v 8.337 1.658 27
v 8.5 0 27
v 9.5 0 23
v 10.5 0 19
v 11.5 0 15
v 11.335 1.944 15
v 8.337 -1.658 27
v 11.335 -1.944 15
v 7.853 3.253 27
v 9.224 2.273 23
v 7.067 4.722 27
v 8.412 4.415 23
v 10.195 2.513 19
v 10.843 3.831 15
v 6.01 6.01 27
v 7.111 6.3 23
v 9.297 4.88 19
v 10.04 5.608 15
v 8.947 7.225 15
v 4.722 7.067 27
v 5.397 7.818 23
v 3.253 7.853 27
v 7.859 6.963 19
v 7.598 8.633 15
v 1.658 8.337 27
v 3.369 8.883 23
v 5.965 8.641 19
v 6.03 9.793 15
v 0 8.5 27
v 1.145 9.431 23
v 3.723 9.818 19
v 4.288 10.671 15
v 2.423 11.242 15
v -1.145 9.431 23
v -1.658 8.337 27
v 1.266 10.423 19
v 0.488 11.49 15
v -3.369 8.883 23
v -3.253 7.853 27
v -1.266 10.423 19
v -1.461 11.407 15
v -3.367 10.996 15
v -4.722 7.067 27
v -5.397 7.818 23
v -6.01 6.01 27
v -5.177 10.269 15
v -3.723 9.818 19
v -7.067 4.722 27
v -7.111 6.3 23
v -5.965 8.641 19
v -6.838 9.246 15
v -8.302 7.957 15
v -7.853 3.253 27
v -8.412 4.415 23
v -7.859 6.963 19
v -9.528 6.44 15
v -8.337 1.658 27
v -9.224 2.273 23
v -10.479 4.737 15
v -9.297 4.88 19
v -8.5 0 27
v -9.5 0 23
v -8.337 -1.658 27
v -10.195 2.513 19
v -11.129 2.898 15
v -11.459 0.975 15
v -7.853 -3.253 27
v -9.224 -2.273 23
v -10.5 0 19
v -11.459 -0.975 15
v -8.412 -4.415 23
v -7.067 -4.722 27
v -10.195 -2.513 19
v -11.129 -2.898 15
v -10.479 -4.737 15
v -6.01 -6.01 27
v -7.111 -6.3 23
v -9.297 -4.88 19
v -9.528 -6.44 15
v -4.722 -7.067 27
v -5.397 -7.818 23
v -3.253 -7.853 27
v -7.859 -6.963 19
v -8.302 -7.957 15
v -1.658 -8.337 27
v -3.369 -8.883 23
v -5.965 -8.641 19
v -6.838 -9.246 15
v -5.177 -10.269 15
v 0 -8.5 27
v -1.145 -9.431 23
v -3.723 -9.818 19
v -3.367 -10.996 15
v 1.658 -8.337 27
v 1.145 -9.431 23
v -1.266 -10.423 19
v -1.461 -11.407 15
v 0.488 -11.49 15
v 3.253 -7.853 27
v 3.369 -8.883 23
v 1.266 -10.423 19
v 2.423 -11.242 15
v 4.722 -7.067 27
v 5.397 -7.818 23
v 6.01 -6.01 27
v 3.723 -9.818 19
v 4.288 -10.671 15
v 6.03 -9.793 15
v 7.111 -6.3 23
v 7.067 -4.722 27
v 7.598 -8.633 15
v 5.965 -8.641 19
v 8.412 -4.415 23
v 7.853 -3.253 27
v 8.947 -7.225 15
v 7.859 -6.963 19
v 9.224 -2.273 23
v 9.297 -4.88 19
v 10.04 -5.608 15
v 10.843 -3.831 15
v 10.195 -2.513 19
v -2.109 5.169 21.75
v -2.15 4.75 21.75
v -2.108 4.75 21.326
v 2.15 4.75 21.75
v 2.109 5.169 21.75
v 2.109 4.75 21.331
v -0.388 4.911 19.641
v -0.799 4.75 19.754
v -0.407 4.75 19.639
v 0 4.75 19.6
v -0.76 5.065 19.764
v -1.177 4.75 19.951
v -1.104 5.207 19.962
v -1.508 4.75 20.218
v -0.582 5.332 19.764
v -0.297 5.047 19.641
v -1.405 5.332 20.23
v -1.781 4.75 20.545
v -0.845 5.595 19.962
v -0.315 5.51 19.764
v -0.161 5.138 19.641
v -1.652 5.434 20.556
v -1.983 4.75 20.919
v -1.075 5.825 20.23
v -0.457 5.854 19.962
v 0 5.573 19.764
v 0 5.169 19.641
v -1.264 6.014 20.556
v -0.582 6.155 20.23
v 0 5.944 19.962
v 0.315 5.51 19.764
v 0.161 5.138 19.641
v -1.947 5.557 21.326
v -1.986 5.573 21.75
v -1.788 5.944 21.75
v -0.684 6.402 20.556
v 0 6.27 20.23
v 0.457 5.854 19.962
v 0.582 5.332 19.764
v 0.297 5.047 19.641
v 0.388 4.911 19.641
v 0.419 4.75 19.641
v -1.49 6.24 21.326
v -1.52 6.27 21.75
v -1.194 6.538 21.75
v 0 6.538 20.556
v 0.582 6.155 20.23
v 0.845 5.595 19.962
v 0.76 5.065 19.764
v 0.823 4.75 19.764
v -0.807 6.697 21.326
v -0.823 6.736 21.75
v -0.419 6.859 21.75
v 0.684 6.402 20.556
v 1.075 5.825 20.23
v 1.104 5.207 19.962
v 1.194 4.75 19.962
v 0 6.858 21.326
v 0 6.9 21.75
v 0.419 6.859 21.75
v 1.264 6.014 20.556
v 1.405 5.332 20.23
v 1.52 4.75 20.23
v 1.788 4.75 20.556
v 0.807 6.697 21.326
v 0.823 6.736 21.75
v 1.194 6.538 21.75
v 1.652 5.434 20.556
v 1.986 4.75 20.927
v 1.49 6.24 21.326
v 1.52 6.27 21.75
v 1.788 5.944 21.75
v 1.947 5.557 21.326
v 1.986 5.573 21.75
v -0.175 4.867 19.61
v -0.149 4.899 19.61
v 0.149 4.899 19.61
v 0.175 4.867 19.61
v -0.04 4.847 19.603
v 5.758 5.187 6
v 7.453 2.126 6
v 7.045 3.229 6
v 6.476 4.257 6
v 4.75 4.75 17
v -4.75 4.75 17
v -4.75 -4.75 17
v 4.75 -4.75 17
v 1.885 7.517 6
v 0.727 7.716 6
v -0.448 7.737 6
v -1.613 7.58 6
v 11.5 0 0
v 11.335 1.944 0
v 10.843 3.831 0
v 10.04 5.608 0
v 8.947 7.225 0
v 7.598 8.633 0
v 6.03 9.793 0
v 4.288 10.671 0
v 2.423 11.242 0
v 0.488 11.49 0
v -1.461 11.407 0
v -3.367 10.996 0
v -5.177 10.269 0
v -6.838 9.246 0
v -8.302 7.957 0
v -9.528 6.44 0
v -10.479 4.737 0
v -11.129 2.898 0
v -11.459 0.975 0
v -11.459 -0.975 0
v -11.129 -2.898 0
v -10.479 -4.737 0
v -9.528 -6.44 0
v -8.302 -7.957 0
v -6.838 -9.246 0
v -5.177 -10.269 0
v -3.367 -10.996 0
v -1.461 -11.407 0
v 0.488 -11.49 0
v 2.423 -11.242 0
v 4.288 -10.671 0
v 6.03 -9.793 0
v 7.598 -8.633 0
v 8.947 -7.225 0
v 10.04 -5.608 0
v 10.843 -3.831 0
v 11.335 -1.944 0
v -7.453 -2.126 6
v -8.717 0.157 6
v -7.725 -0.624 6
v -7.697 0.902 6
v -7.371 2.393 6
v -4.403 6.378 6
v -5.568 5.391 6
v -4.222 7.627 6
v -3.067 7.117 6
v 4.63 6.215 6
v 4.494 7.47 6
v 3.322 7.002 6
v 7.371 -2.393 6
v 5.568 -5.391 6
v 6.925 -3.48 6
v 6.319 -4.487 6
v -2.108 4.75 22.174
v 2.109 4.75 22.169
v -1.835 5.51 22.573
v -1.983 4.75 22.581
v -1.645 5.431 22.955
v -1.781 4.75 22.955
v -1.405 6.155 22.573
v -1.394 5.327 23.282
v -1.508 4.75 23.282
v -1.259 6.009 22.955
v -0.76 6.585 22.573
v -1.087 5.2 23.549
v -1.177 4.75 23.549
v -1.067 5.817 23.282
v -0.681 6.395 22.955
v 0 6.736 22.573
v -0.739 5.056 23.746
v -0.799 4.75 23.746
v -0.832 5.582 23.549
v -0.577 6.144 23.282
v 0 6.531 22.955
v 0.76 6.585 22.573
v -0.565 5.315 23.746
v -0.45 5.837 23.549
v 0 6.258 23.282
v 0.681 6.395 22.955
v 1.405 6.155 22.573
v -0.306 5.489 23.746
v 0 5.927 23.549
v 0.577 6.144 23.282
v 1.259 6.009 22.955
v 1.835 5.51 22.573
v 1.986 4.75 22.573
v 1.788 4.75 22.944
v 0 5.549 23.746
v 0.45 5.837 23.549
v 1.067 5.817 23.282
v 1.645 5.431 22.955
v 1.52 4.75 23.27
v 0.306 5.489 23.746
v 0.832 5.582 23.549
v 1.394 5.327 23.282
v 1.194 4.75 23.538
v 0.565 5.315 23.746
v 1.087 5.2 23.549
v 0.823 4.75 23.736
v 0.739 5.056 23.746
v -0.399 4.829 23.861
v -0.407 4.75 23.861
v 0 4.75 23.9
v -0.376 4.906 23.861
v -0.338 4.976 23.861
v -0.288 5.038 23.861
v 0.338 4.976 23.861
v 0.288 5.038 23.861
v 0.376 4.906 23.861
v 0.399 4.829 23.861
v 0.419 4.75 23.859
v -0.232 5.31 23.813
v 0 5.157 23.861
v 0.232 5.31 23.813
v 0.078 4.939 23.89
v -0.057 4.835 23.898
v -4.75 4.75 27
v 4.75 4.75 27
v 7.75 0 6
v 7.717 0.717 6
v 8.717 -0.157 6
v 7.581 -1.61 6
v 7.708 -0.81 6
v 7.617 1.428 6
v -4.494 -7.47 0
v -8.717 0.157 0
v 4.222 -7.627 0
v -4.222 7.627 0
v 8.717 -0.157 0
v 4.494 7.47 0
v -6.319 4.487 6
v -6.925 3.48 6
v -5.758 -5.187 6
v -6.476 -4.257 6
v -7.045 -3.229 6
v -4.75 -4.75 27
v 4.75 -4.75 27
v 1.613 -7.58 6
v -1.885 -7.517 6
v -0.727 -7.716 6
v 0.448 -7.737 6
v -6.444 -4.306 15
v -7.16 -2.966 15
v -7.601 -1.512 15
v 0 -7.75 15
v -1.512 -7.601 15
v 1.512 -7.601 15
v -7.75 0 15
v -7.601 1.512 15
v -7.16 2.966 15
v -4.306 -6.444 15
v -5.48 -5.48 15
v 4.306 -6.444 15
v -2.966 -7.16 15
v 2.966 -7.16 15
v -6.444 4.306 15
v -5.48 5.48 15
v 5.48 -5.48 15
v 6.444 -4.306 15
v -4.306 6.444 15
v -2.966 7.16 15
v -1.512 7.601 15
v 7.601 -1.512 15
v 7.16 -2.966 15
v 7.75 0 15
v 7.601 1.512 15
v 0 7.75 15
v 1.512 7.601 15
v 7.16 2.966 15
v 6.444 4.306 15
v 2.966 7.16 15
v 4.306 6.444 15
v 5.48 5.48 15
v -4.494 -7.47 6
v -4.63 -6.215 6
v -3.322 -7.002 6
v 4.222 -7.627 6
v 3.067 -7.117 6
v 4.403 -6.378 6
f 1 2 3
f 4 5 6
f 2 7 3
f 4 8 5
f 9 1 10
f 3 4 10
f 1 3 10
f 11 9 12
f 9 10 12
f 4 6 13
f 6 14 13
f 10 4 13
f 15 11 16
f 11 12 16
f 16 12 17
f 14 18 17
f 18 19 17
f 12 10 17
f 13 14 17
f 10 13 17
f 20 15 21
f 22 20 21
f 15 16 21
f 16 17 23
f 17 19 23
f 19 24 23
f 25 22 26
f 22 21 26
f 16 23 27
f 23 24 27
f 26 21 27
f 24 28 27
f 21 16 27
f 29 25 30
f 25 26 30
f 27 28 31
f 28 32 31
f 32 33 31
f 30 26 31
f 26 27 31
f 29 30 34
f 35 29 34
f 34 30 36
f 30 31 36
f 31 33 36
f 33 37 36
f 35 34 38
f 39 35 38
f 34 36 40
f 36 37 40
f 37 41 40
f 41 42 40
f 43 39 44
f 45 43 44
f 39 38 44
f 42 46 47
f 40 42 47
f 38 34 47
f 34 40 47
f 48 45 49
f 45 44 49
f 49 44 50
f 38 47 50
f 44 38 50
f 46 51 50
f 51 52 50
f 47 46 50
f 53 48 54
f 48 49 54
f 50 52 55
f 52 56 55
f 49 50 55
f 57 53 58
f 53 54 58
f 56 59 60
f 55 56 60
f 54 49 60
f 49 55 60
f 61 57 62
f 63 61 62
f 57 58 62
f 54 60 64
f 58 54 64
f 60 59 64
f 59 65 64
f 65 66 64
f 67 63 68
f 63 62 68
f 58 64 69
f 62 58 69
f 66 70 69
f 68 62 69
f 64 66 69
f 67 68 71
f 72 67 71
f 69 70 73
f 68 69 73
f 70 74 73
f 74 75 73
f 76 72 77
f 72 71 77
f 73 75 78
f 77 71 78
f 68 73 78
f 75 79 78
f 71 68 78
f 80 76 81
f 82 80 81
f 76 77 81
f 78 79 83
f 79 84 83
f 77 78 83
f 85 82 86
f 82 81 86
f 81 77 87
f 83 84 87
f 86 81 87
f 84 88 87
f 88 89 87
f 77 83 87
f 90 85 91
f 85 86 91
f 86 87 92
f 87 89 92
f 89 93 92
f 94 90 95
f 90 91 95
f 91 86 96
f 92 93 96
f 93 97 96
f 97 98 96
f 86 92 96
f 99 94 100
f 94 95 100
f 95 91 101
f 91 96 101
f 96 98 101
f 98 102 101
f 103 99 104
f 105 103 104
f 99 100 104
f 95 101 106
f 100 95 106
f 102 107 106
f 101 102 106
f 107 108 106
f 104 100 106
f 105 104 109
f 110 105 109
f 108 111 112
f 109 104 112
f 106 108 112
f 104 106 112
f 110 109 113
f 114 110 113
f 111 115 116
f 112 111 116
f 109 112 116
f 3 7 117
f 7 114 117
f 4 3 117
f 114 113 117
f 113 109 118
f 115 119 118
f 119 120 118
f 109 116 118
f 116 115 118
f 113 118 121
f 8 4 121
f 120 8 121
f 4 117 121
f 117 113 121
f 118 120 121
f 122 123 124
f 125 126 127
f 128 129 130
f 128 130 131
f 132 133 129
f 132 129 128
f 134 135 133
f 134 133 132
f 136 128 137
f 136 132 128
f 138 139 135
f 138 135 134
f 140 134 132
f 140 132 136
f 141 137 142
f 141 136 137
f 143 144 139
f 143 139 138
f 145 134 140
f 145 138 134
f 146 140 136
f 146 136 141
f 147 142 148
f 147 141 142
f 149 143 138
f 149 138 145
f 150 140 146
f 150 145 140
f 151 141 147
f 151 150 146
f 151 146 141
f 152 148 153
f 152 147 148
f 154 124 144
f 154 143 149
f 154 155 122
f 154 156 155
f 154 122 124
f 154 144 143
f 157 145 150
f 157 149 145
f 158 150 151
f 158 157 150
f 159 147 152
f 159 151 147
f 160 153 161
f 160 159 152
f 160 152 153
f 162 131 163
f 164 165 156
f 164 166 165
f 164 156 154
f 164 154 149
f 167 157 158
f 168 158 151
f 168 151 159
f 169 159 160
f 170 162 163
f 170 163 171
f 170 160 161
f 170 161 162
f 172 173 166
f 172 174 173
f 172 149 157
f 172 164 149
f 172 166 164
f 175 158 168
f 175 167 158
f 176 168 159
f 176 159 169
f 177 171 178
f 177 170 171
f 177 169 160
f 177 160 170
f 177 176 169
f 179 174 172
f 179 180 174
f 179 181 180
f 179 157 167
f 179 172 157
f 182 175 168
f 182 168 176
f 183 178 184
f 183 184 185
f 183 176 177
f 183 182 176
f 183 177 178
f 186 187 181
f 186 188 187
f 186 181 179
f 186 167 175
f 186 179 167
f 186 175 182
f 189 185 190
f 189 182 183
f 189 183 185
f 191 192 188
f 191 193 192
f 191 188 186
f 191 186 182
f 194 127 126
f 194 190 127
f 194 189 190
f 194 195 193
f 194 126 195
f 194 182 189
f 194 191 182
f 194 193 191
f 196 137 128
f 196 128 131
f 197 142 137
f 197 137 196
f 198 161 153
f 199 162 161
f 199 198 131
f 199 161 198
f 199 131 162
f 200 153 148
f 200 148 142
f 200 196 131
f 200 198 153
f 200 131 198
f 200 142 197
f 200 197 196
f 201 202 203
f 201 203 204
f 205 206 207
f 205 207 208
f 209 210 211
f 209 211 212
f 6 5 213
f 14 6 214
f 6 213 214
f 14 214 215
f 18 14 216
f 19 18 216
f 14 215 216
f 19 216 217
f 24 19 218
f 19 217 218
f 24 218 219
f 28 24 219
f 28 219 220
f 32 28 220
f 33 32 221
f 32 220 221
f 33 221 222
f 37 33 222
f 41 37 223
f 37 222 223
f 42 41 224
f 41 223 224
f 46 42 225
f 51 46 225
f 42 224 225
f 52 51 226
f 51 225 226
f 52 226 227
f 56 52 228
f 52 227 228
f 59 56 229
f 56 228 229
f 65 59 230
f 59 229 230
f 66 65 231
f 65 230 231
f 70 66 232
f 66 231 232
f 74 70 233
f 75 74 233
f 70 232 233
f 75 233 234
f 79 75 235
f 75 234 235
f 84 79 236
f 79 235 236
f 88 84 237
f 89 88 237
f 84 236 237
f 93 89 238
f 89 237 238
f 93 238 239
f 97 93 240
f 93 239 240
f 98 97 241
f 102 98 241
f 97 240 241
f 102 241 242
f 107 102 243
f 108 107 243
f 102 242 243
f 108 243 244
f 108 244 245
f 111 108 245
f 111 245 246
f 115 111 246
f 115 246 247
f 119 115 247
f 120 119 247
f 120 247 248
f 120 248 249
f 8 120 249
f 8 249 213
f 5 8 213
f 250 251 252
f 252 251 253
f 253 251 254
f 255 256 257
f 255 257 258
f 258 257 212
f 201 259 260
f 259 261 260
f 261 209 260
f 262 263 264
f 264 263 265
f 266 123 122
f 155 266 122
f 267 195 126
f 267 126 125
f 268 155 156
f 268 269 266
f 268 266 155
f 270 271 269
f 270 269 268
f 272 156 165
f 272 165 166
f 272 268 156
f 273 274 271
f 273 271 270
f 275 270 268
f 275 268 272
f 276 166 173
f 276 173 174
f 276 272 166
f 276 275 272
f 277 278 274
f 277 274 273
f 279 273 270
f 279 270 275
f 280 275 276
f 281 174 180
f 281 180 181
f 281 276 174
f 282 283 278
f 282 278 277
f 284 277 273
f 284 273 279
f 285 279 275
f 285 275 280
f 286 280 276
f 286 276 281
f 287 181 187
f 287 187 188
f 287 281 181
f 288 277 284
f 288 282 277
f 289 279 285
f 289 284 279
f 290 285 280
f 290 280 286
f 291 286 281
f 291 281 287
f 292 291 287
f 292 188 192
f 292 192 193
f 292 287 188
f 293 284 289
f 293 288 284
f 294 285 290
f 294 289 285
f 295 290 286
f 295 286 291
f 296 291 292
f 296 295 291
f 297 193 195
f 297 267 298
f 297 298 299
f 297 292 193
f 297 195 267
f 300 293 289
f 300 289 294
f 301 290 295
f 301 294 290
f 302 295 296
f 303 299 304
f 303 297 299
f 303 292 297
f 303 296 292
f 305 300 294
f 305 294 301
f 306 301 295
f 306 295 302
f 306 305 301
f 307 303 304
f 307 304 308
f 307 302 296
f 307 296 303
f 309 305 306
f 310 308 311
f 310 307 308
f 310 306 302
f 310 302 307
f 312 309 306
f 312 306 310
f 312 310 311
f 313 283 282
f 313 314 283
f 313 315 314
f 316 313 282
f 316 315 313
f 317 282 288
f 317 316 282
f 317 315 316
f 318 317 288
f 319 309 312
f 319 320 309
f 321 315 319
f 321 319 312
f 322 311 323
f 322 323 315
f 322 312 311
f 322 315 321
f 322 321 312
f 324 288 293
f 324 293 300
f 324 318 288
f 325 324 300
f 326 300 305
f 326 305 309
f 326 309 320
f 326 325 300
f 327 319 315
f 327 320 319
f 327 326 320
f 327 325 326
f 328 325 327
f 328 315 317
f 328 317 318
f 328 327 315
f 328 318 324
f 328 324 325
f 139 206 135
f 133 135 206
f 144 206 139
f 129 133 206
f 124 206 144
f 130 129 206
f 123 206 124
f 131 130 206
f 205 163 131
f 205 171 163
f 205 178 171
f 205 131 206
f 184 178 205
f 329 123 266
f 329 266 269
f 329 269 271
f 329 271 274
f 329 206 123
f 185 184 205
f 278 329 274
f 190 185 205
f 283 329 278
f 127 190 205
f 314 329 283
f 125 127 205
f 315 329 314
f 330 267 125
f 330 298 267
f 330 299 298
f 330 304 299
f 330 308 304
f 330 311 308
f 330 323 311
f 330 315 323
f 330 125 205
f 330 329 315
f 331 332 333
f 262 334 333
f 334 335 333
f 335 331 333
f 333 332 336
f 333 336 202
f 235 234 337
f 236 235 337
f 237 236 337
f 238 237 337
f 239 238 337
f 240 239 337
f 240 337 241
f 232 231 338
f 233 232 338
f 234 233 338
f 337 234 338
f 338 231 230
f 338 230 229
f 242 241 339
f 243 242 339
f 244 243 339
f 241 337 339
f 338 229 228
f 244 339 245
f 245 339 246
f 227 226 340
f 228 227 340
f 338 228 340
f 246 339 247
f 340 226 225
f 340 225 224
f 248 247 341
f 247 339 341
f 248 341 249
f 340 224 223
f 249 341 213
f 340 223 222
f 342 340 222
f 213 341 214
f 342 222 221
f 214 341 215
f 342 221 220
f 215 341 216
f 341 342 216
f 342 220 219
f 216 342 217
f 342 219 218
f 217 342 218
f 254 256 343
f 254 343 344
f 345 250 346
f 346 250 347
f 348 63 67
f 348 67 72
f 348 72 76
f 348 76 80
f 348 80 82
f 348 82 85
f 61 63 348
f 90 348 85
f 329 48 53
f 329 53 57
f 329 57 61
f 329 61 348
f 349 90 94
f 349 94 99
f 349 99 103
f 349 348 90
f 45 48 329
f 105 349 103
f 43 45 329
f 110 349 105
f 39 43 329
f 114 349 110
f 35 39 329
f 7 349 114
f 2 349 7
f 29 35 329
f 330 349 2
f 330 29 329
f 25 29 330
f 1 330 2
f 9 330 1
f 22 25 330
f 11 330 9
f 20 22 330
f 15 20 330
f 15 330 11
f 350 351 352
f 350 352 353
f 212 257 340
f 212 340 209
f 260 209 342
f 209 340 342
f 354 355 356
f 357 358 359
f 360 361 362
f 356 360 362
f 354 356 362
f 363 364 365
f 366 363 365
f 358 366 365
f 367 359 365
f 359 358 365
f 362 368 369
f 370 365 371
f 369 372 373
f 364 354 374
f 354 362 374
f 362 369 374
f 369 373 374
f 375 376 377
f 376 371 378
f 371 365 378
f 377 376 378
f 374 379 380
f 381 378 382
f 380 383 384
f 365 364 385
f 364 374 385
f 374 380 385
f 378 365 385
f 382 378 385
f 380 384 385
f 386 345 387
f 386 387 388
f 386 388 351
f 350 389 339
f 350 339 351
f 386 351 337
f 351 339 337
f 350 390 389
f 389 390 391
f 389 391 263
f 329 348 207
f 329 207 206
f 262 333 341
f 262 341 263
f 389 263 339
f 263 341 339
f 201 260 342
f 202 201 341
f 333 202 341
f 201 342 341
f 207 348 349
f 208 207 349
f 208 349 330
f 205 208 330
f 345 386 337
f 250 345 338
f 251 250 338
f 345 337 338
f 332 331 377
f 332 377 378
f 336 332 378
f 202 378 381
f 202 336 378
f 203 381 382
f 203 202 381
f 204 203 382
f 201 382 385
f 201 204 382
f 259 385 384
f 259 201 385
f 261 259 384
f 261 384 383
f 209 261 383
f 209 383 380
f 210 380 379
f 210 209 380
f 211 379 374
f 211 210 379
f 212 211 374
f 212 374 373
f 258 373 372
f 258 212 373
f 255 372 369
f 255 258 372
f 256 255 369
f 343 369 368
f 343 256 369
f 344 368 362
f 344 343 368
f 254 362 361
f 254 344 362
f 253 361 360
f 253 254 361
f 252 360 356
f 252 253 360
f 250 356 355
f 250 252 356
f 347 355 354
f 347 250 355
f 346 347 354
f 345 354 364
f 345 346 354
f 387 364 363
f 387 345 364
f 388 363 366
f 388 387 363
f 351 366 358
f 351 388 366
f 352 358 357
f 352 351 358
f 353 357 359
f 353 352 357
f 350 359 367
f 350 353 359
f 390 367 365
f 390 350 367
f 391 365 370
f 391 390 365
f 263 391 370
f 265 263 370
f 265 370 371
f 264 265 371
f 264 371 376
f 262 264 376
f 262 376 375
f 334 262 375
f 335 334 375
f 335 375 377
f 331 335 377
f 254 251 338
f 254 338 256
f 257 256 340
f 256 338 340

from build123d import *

# Parameters (mm, degrees)
F0_R      = 11.5
F1_DEPTH  = 6
F3_R      = 11.5
F3_R_2    = 7.75
F4_DEPTH  = 9
F6_R      = 8.5
F7_R      = 11.5
F9_W      = 9.5
F9_H      = 9.5
F10_DEPTH = 10


with BuildPart() as f1:
    # F0 (on Top) → F1 (new body)
    with BuildSketch(Plane.XY):
        Circle(F0_R)
        Polygon((4.494297, 7.47025), (8.716574, -0.15705), (4.222277, -7.6273), (-4.494297, -7.47025), (-8.716574, 0.15705), (-4.222277, 7.6273), align=None, mode=Mode.SUBTRACT)
    extrude(amount=F1_DEPTH)

    # F3 (on offset) → F4 (join)
    with BuildSketch(Plane.XY.offset(6)):
        Circle(F3_R)
        Circle(F3_R_2, mode=Mode.SUBTRACT)
    extrude(amount=F4_DEPTH)

    # F6 (on offset) → F8 section 0
    with BuildSketch(Plane.XY.offset(27)):
        Circle(F6_R)
    # F7 (on face) → F8 section 1
    with BuildSketch(Plane.XY.offset(15)):
        Circle(F7_R)
    loft()

    # F9 (on face) → F10 (cut)
    with BuildSketch(Plane.XY.offset(27)):
        Rectangle(F9_W, F9_H)
    extrude(amount=-F10_DEPTH, mode=Mode.SUBTRACT)

    # F11 (on face) → F12 (revolve, cut)
    with BuildSketch(Plane.XZ.offset(-4.75)):
        with BuildLine():
            ThreePointArc((2.15, 21.75), (1.52028, 23.27028), (0, 23.9))
            Line((0, 23.9), (0, 21.75))
            Line((0, 21.75), (0, 19.6))
            ThreePointArc((0, 19.6), (1.52028, 20.22972), (2.15, 21.75))
        make_face()
    revolve(axis=Axis((0, 4.75, 24.375), (0, 0, -1)), mode=Mode.SUBTRACT)


solid = f1.part
